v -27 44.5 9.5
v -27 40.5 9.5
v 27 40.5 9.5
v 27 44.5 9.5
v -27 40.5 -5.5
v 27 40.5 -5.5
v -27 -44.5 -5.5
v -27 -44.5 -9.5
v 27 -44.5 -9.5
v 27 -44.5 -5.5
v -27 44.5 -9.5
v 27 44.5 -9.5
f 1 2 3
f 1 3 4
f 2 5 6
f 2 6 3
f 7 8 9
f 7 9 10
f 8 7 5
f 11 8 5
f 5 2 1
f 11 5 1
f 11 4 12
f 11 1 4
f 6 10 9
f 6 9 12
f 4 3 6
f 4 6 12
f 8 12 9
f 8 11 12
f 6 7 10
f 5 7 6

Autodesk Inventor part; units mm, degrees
ref_plane "YZ Plane" through (0, 0, 0) normal (1, 0, 0) x (0, 1, 0)
ref_plane "XZ Plane" through (0, 0, 0) normal (0, 1, 0) x (-1, 0, 0)
ref_plane "XY Plane" through (0, 0, 0) normal (0, 0, 1) x (1, 0, 0)
sketch "Skizze1" plane through (0, 0, 0) normal (1, 0, 0) x (0, 1, 0)
  line L0 (-44.5, -5.5) -> (40.5, -5.5)
  line L1 (44.5, -9.5) -> (-44.5, -9.5)
  line L2 (-44.5, -9.5) -> (-44.5, -5.5)
  line L3 (40.5, -5.5) -> (40.5, 9.5)
  line L4 (40.5, 9.5) -> (44.5, 9.5)
  line L5 (44.5, 9.5) -> (44.5, -9.5)
  point P0 (0, 0)
  point P1 (44.5, 0)
  point P2 (0, -9.5)
  dimension "d0" = 4
  dimension "d2" = 4
  dimension "d3" = 19
  dimension "d6" = 89
extrude "Extrusion1" add sketch "Skizze1" along normal mid plane 54
properties part number "Platinenhalter-einzeln"
